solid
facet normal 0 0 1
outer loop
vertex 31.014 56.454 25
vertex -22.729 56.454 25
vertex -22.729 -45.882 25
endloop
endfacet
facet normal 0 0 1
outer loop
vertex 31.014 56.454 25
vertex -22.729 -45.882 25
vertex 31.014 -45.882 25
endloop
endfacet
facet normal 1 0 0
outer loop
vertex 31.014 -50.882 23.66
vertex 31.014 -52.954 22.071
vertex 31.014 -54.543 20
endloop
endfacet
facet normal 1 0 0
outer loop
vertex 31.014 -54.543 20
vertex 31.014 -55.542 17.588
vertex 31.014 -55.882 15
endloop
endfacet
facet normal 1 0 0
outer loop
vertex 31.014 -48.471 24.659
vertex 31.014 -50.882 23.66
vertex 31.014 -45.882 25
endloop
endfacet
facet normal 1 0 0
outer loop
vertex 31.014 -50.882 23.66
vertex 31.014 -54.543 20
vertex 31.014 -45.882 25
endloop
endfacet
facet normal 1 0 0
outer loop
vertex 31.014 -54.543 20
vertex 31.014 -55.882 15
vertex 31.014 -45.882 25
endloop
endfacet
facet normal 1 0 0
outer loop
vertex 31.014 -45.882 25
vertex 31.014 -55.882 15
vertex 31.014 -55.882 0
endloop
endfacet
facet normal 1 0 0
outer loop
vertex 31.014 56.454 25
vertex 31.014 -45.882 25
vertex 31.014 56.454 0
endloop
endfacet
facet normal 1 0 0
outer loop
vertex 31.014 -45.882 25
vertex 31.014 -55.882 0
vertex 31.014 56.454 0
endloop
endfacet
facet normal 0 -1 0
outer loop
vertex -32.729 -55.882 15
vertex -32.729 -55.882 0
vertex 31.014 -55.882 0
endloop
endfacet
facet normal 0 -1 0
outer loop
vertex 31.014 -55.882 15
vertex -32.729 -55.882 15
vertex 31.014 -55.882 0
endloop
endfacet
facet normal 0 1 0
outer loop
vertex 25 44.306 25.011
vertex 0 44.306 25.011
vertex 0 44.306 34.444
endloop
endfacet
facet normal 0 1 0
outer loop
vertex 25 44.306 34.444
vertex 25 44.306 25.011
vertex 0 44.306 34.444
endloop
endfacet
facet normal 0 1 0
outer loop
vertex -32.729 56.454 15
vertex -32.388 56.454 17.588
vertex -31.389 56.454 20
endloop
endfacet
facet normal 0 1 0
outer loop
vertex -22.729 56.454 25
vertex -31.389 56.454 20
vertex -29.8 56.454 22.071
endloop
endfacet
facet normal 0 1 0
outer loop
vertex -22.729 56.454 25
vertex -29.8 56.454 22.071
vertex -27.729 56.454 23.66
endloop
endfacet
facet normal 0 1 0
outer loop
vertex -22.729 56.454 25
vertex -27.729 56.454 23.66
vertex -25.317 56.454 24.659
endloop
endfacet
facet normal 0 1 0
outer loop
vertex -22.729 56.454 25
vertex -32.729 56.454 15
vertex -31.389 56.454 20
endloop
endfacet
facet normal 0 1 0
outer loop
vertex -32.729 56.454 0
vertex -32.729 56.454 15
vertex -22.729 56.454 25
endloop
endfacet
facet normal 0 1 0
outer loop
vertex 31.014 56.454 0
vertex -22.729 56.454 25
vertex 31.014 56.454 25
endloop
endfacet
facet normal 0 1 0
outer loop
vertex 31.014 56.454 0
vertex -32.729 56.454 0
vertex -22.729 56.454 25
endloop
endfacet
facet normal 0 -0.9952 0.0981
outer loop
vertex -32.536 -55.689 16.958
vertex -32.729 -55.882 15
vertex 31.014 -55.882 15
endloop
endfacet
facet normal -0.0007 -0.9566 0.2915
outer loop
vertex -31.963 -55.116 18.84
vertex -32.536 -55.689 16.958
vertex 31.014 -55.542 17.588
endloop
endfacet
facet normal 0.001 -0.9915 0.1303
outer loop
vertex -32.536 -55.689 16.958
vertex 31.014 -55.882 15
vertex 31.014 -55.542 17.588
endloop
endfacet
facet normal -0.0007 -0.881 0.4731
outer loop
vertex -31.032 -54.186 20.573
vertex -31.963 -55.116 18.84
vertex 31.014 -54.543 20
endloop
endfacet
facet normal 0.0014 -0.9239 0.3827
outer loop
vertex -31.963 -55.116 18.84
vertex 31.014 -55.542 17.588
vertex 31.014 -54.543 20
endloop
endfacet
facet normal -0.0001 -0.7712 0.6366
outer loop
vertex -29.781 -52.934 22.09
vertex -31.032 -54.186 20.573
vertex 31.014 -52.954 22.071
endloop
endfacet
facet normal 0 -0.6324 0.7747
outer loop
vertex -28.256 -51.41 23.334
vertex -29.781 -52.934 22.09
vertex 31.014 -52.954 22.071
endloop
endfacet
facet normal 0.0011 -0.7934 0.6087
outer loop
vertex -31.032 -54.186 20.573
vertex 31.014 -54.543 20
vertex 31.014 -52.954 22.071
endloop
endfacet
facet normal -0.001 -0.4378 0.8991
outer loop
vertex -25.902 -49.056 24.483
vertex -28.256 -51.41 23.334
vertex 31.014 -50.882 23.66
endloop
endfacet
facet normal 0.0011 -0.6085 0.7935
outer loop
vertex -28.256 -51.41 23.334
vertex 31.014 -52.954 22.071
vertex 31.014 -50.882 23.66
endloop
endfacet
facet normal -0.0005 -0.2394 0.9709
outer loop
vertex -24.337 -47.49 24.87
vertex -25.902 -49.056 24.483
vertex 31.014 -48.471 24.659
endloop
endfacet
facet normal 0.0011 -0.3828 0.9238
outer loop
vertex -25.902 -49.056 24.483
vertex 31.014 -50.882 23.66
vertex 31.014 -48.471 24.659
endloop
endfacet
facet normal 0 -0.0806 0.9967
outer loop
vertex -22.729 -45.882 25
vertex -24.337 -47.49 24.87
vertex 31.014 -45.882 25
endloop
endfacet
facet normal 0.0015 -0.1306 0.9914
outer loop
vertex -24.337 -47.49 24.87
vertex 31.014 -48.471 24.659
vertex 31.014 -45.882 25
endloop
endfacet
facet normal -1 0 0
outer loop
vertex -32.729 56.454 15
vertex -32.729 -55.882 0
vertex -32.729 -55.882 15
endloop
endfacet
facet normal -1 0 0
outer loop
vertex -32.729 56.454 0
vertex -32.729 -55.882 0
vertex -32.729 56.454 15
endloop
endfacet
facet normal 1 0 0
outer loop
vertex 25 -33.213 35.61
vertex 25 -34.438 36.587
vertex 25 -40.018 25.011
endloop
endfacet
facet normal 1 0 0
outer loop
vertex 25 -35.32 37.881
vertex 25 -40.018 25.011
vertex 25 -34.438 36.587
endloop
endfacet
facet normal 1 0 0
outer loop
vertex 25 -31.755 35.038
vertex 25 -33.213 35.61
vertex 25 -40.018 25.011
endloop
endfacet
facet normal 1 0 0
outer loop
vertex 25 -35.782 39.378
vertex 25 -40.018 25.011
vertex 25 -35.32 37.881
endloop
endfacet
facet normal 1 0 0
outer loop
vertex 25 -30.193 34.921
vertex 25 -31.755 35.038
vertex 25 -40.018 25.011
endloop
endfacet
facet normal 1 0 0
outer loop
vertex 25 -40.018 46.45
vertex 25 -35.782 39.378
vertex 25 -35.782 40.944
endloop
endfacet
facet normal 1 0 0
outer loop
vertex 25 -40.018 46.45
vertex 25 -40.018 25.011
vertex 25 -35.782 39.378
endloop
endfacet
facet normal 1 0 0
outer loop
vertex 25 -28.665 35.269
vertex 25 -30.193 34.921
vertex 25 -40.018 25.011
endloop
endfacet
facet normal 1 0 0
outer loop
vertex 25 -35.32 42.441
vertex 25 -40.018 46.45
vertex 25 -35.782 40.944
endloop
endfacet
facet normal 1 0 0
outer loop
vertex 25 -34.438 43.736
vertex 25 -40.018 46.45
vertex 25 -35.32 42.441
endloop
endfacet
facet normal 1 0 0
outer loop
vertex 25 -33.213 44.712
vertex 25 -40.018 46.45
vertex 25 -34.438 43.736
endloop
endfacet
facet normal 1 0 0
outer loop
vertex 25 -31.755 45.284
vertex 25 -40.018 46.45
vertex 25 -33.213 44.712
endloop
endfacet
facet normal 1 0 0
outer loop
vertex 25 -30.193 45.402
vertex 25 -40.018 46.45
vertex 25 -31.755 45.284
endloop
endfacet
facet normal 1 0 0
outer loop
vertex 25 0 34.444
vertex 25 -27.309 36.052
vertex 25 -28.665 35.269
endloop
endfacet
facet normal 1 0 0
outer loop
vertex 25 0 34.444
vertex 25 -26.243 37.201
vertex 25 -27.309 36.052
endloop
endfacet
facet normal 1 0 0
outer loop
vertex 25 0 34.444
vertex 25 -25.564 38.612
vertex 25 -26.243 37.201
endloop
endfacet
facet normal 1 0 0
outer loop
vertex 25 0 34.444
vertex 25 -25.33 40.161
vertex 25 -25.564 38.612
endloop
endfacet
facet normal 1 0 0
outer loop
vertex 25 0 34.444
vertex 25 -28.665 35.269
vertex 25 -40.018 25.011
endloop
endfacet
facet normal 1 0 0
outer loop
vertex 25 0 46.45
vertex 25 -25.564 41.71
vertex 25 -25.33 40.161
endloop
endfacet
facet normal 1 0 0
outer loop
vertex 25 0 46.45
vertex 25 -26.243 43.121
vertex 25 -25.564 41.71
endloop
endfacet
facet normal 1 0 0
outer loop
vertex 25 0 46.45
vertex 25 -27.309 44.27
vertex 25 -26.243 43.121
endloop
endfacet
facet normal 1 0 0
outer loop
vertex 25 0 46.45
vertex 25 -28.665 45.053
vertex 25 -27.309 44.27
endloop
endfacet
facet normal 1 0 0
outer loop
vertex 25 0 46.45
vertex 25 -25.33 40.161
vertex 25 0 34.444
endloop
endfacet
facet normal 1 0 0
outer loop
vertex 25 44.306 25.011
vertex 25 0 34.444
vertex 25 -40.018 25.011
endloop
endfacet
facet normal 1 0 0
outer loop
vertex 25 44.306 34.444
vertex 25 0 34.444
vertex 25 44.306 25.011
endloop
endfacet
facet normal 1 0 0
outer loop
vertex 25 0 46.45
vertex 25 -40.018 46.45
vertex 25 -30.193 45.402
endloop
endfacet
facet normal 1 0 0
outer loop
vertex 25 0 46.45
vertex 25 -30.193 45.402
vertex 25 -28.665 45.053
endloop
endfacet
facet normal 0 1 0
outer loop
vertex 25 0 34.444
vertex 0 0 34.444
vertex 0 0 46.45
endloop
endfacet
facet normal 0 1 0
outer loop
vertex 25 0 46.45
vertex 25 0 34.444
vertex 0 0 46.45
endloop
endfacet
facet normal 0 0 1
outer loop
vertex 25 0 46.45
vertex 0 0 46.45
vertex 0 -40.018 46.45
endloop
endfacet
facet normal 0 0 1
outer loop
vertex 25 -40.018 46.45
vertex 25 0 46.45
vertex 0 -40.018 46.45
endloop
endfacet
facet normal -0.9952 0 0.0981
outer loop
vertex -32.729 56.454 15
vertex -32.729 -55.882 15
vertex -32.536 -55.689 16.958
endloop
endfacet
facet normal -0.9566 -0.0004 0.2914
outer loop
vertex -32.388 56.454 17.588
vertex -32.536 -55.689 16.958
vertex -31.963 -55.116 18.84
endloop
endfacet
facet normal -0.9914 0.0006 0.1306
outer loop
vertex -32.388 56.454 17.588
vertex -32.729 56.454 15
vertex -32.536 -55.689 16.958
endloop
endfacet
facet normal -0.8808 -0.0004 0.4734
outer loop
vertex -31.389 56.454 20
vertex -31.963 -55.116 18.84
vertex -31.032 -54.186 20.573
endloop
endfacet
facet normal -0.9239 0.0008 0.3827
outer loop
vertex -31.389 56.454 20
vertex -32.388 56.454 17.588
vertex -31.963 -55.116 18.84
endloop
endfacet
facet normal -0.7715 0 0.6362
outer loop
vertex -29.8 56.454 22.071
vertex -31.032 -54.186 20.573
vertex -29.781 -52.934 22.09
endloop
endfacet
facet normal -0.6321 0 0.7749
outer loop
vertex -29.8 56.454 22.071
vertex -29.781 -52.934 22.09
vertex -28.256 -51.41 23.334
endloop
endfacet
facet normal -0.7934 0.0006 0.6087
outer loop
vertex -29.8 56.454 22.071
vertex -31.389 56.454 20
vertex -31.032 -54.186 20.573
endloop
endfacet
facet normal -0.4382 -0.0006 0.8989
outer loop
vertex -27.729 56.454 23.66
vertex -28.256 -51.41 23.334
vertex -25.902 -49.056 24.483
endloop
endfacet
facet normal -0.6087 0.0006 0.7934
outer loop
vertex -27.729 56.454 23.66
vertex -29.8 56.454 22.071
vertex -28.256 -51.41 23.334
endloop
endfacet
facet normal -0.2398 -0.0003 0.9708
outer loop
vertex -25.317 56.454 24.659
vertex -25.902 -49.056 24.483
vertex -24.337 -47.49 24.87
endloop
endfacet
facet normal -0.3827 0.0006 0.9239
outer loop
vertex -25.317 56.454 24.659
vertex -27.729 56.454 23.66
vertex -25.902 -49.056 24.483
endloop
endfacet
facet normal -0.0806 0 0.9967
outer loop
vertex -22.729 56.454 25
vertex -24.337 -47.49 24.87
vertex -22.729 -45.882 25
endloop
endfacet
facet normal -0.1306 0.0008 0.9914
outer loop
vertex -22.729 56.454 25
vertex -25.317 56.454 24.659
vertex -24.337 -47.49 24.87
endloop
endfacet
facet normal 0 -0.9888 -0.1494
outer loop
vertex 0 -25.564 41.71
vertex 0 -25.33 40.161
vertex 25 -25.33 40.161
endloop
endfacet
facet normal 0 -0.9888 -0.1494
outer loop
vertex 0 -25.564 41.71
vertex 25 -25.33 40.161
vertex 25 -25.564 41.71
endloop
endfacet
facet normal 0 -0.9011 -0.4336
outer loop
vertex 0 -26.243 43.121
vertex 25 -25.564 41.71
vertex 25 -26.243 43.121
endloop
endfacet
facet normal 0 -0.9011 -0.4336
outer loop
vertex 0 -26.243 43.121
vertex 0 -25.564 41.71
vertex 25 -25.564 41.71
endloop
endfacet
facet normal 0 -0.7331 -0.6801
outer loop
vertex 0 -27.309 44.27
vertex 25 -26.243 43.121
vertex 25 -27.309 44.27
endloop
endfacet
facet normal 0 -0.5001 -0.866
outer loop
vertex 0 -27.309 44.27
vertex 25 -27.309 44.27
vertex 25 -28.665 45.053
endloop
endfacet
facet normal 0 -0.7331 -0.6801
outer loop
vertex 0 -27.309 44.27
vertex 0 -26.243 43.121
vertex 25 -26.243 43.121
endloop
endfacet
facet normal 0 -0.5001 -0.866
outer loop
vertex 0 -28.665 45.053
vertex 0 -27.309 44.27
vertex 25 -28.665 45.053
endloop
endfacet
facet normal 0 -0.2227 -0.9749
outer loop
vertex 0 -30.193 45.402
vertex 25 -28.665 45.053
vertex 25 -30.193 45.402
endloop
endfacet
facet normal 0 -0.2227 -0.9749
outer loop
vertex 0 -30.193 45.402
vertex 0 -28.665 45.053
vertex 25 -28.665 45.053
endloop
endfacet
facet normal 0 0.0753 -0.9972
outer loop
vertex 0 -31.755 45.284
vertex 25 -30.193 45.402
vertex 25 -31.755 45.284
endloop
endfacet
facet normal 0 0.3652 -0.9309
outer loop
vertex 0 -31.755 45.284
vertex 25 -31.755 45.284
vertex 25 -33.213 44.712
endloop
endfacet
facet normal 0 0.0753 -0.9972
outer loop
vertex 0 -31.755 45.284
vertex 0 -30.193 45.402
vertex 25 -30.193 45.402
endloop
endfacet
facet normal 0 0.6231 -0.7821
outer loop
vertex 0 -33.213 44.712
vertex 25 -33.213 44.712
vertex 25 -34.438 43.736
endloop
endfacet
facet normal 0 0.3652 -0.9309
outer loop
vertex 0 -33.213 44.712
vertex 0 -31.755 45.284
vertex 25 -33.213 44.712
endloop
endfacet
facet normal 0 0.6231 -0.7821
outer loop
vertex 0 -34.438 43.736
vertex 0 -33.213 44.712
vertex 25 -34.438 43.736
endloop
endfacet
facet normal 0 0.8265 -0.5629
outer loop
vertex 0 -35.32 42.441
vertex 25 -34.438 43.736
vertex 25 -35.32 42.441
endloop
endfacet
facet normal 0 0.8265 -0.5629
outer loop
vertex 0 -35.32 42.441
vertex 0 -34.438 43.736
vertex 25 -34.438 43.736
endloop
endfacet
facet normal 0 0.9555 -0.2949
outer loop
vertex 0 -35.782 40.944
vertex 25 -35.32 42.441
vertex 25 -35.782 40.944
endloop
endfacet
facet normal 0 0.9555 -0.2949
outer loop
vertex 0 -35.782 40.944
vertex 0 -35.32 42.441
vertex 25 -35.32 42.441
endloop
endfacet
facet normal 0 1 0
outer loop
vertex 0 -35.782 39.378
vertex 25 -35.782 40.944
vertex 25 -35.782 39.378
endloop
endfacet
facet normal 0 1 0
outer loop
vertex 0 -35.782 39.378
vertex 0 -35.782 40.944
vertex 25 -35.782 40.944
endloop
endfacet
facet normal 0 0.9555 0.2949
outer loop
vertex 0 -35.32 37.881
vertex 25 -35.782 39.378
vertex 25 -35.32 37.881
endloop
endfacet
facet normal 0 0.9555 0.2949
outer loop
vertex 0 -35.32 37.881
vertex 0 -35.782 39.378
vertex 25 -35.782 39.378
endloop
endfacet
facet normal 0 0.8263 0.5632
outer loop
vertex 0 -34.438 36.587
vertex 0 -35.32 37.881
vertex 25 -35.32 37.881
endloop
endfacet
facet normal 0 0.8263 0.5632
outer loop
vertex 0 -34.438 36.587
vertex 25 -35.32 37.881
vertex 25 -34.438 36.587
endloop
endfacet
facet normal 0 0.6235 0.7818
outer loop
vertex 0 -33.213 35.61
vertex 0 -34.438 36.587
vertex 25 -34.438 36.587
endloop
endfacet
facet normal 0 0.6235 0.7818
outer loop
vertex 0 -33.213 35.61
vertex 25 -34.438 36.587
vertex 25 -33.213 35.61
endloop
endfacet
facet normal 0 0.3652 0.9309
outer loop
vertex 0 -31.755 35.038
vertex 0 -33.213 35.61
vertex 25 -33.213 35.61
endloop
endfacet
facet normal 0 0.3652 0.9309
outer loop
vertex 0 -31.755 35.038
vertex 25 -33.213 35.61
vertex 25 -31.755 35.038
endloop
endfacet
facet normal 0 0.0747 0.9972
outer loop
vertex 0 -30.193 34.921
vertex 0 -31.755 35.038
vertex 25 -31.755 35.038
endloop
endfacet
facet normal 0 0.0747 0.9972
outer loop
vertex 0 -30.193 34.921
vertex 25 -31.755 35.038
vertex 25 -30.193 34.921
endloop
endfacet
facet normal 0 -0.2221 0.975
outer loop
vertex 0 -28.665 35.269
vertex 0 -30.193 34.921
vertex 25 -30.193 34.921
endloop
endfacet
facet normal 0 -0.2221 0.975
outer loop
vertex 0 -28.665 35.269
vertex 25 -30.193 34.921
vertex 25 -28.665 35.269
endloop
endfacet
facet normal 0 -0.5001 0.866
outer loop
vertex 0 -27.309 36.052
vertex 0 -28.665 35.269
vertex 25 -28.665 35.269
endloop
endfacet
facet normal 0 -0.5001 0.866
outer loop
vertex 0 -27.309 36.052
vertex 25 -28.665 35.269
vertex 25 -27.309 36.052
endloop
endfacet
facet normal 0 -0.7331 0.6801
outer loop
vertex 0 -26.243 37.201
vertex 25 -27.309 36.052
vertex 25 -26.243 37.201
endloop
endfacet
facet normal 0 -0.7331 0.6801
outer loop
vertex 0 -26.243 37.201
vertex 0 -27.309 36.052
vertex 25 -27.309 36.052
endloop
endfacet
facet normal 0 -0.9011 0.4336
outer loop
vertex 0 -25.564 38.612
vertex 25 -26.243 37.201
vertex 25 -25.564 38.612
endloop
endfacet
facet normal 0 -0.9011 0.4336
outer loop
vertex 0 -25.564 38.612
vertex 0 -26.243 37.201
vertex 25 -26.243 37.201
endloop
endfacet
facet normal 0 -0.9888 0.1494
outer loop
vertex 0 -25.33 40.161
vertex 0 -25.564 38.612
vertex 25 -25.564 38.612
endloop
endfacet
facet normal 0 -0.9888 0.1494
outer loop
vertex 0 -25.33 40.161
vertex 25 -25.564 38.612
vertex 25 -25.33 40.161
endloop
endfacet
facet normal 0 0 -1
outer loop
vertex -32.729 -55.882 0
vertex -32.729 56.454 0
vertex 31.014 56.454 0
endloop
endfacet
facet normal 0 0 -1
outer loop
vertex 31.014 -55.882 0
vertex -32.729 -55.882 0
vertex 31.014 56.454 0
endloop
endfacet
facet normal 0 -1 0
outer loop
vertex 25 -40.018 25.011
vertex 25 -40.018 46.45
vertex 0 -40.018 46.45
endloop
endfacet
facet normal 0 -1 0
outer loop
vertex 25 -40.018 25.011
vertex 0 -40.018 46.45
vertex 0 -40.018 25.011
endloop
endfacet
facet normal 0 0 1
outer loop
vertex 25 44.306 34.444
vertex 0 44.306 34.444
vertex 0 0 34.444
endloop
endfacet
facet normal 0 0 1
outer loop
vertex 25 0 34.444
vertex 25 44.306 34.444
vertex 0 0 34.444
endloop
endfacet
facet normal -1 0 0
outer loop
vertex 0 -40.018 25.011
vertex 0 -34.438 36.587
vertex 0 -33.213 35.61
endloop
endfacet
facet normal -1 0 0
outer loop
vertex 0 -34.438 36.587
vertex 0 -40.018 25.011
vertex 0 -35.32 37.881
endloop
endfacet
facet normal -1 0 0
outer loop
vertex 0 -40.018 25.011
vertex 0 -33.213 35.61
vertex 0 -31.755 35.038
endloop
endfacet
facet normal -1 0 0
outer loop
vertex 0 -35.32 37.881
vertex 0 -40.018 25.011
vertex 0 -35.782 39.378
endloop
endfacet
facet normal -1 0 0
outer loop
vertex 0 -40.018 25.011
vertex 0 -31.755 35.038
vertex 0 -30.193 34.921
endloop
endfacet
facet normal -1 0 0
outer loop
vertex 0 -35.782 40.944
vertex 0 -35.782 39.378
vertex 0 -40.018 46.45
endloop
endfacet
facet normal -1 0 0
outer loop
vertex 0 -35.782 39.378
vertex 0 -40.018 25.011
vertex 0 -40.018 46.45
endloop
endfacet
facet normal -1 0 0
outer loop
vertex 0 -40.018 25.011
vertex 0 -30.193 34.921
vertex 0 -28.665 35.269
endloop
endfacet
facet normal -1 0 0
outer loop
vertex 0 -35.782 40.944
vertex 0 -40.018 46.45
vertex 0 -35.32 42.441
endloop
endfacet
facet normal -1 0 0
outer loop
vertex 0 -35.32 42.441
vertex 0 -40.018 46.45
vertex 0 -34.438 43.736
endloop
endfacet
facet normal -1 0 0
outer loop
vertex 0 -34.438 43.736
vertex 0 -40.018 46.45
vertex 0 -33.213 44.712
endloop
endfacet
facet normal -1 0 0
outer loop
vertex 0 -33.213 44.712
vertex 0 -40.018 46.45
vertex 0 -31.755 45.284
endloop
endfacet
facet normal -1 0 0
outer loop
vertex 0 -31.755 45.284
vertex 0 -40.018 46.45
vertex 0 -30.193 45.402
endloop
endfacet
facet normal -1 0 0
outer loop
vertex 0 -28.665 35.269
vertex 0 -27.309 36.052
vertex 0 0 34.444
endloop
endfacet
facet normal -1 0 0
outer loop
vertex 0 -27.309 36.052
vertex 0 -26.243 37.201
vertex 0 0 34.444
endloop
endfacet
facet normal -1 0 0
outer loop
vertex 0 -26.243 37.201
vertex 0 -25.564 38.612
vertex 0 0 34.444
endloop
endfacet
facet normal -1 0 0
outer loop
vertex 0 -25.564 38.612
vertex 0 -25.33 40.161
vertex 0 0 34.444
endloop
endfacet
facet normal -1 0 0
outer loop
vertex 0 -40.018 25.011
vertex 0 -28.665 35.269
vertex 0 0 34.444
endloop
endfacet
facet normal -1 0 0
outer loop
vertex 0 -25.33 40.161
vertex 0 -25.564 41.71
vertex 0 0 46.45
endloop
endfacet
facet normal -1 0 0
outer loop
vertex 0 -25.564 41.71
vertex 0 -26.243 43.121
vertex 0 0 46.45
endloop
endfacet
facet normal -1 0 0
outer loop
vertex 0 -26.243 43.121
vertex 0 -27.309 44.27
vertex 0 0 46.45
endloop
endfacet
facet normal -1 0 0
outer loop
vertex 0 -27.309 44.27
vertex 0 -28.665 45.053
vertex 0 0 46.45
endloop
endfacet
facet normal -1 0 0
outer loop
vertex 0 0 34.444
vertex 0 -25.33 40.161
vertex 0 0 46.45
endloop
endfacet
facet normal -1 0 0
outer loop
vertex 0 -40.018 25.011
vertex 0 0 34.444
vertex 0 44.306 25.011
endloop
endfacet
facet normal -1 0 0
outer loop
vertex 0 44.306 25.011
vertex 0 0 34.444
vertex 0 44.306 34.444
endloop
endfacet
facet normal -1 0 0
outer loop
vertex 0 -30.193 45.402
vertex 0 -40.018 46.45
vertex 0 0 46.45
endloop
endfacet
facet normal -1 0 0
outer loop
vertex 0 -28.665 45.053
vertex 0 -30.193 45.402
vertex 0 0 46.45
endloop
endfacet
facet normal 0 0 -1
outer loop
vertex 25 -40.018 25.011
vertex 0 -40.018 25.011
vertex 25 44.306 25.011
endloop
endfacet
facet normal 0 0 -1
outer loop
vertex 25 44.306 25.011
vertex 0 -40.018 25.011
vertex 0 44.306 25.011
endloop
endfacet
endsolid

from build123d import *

# Parameters (mm, degrees)
F0_W     = 63.7431945652
F0_H     = 112.3366653919
F0_W_2   = 17.1506376937
F0_H_2   = 100.6170623004
F1_DEPTH = 25
F2_R     = 5.2551759541
F3_DEPTH = 25
F4_R     = 10


with BuildPart() as f1:
    # F0 (on Top) → F1 (new body)
    with BuildSketch(Plane.XY):
        with Locations((-0.8575329557, 0.2858452499)):
            Rectangle(F0_W, F0_H)
        with Locations((-0.4287636839, 0.1429226249)):
            Rectangle(F0_W_2, F0_H_2, mode=Mode.SUBTRACT)
        with Locations((-0.4287636839, 0.1429226249)):
            Rectangle(F0_W_2, F0_H_2)
    extrude(amount=F1_DEPTH)

    # F4
    f4_edges = [f1.edges().sort_by_distance(p)[0] for p in [
        (-32.72913, 0.285845, 25),
        (-0.857533, -55.882487, 25),
    ]]
    fillet(f4_edges, radius=F4_R)


with BuildPart() as f3:
    # F2 (on Right) → F3 (new body)
    with BuildSketch(Plane.YZ):
        Polygon((-40.0181524456, 46.4496389031), (-40.0181524456, 25.0113438815), (44.3058088422, 25.0113438815), (44.3058088422, 34.4441942871), (0, 34.4441942871), (0, 46.4496389031), align=None)
        with Locations((-30.5853001773, 40.1610732079)):
            Circle(F2_R, mode=Mode.SUBTRACT)
    extrude(amount=F3_DEPTH)


solid = Compound([f1.part, f3.part])
